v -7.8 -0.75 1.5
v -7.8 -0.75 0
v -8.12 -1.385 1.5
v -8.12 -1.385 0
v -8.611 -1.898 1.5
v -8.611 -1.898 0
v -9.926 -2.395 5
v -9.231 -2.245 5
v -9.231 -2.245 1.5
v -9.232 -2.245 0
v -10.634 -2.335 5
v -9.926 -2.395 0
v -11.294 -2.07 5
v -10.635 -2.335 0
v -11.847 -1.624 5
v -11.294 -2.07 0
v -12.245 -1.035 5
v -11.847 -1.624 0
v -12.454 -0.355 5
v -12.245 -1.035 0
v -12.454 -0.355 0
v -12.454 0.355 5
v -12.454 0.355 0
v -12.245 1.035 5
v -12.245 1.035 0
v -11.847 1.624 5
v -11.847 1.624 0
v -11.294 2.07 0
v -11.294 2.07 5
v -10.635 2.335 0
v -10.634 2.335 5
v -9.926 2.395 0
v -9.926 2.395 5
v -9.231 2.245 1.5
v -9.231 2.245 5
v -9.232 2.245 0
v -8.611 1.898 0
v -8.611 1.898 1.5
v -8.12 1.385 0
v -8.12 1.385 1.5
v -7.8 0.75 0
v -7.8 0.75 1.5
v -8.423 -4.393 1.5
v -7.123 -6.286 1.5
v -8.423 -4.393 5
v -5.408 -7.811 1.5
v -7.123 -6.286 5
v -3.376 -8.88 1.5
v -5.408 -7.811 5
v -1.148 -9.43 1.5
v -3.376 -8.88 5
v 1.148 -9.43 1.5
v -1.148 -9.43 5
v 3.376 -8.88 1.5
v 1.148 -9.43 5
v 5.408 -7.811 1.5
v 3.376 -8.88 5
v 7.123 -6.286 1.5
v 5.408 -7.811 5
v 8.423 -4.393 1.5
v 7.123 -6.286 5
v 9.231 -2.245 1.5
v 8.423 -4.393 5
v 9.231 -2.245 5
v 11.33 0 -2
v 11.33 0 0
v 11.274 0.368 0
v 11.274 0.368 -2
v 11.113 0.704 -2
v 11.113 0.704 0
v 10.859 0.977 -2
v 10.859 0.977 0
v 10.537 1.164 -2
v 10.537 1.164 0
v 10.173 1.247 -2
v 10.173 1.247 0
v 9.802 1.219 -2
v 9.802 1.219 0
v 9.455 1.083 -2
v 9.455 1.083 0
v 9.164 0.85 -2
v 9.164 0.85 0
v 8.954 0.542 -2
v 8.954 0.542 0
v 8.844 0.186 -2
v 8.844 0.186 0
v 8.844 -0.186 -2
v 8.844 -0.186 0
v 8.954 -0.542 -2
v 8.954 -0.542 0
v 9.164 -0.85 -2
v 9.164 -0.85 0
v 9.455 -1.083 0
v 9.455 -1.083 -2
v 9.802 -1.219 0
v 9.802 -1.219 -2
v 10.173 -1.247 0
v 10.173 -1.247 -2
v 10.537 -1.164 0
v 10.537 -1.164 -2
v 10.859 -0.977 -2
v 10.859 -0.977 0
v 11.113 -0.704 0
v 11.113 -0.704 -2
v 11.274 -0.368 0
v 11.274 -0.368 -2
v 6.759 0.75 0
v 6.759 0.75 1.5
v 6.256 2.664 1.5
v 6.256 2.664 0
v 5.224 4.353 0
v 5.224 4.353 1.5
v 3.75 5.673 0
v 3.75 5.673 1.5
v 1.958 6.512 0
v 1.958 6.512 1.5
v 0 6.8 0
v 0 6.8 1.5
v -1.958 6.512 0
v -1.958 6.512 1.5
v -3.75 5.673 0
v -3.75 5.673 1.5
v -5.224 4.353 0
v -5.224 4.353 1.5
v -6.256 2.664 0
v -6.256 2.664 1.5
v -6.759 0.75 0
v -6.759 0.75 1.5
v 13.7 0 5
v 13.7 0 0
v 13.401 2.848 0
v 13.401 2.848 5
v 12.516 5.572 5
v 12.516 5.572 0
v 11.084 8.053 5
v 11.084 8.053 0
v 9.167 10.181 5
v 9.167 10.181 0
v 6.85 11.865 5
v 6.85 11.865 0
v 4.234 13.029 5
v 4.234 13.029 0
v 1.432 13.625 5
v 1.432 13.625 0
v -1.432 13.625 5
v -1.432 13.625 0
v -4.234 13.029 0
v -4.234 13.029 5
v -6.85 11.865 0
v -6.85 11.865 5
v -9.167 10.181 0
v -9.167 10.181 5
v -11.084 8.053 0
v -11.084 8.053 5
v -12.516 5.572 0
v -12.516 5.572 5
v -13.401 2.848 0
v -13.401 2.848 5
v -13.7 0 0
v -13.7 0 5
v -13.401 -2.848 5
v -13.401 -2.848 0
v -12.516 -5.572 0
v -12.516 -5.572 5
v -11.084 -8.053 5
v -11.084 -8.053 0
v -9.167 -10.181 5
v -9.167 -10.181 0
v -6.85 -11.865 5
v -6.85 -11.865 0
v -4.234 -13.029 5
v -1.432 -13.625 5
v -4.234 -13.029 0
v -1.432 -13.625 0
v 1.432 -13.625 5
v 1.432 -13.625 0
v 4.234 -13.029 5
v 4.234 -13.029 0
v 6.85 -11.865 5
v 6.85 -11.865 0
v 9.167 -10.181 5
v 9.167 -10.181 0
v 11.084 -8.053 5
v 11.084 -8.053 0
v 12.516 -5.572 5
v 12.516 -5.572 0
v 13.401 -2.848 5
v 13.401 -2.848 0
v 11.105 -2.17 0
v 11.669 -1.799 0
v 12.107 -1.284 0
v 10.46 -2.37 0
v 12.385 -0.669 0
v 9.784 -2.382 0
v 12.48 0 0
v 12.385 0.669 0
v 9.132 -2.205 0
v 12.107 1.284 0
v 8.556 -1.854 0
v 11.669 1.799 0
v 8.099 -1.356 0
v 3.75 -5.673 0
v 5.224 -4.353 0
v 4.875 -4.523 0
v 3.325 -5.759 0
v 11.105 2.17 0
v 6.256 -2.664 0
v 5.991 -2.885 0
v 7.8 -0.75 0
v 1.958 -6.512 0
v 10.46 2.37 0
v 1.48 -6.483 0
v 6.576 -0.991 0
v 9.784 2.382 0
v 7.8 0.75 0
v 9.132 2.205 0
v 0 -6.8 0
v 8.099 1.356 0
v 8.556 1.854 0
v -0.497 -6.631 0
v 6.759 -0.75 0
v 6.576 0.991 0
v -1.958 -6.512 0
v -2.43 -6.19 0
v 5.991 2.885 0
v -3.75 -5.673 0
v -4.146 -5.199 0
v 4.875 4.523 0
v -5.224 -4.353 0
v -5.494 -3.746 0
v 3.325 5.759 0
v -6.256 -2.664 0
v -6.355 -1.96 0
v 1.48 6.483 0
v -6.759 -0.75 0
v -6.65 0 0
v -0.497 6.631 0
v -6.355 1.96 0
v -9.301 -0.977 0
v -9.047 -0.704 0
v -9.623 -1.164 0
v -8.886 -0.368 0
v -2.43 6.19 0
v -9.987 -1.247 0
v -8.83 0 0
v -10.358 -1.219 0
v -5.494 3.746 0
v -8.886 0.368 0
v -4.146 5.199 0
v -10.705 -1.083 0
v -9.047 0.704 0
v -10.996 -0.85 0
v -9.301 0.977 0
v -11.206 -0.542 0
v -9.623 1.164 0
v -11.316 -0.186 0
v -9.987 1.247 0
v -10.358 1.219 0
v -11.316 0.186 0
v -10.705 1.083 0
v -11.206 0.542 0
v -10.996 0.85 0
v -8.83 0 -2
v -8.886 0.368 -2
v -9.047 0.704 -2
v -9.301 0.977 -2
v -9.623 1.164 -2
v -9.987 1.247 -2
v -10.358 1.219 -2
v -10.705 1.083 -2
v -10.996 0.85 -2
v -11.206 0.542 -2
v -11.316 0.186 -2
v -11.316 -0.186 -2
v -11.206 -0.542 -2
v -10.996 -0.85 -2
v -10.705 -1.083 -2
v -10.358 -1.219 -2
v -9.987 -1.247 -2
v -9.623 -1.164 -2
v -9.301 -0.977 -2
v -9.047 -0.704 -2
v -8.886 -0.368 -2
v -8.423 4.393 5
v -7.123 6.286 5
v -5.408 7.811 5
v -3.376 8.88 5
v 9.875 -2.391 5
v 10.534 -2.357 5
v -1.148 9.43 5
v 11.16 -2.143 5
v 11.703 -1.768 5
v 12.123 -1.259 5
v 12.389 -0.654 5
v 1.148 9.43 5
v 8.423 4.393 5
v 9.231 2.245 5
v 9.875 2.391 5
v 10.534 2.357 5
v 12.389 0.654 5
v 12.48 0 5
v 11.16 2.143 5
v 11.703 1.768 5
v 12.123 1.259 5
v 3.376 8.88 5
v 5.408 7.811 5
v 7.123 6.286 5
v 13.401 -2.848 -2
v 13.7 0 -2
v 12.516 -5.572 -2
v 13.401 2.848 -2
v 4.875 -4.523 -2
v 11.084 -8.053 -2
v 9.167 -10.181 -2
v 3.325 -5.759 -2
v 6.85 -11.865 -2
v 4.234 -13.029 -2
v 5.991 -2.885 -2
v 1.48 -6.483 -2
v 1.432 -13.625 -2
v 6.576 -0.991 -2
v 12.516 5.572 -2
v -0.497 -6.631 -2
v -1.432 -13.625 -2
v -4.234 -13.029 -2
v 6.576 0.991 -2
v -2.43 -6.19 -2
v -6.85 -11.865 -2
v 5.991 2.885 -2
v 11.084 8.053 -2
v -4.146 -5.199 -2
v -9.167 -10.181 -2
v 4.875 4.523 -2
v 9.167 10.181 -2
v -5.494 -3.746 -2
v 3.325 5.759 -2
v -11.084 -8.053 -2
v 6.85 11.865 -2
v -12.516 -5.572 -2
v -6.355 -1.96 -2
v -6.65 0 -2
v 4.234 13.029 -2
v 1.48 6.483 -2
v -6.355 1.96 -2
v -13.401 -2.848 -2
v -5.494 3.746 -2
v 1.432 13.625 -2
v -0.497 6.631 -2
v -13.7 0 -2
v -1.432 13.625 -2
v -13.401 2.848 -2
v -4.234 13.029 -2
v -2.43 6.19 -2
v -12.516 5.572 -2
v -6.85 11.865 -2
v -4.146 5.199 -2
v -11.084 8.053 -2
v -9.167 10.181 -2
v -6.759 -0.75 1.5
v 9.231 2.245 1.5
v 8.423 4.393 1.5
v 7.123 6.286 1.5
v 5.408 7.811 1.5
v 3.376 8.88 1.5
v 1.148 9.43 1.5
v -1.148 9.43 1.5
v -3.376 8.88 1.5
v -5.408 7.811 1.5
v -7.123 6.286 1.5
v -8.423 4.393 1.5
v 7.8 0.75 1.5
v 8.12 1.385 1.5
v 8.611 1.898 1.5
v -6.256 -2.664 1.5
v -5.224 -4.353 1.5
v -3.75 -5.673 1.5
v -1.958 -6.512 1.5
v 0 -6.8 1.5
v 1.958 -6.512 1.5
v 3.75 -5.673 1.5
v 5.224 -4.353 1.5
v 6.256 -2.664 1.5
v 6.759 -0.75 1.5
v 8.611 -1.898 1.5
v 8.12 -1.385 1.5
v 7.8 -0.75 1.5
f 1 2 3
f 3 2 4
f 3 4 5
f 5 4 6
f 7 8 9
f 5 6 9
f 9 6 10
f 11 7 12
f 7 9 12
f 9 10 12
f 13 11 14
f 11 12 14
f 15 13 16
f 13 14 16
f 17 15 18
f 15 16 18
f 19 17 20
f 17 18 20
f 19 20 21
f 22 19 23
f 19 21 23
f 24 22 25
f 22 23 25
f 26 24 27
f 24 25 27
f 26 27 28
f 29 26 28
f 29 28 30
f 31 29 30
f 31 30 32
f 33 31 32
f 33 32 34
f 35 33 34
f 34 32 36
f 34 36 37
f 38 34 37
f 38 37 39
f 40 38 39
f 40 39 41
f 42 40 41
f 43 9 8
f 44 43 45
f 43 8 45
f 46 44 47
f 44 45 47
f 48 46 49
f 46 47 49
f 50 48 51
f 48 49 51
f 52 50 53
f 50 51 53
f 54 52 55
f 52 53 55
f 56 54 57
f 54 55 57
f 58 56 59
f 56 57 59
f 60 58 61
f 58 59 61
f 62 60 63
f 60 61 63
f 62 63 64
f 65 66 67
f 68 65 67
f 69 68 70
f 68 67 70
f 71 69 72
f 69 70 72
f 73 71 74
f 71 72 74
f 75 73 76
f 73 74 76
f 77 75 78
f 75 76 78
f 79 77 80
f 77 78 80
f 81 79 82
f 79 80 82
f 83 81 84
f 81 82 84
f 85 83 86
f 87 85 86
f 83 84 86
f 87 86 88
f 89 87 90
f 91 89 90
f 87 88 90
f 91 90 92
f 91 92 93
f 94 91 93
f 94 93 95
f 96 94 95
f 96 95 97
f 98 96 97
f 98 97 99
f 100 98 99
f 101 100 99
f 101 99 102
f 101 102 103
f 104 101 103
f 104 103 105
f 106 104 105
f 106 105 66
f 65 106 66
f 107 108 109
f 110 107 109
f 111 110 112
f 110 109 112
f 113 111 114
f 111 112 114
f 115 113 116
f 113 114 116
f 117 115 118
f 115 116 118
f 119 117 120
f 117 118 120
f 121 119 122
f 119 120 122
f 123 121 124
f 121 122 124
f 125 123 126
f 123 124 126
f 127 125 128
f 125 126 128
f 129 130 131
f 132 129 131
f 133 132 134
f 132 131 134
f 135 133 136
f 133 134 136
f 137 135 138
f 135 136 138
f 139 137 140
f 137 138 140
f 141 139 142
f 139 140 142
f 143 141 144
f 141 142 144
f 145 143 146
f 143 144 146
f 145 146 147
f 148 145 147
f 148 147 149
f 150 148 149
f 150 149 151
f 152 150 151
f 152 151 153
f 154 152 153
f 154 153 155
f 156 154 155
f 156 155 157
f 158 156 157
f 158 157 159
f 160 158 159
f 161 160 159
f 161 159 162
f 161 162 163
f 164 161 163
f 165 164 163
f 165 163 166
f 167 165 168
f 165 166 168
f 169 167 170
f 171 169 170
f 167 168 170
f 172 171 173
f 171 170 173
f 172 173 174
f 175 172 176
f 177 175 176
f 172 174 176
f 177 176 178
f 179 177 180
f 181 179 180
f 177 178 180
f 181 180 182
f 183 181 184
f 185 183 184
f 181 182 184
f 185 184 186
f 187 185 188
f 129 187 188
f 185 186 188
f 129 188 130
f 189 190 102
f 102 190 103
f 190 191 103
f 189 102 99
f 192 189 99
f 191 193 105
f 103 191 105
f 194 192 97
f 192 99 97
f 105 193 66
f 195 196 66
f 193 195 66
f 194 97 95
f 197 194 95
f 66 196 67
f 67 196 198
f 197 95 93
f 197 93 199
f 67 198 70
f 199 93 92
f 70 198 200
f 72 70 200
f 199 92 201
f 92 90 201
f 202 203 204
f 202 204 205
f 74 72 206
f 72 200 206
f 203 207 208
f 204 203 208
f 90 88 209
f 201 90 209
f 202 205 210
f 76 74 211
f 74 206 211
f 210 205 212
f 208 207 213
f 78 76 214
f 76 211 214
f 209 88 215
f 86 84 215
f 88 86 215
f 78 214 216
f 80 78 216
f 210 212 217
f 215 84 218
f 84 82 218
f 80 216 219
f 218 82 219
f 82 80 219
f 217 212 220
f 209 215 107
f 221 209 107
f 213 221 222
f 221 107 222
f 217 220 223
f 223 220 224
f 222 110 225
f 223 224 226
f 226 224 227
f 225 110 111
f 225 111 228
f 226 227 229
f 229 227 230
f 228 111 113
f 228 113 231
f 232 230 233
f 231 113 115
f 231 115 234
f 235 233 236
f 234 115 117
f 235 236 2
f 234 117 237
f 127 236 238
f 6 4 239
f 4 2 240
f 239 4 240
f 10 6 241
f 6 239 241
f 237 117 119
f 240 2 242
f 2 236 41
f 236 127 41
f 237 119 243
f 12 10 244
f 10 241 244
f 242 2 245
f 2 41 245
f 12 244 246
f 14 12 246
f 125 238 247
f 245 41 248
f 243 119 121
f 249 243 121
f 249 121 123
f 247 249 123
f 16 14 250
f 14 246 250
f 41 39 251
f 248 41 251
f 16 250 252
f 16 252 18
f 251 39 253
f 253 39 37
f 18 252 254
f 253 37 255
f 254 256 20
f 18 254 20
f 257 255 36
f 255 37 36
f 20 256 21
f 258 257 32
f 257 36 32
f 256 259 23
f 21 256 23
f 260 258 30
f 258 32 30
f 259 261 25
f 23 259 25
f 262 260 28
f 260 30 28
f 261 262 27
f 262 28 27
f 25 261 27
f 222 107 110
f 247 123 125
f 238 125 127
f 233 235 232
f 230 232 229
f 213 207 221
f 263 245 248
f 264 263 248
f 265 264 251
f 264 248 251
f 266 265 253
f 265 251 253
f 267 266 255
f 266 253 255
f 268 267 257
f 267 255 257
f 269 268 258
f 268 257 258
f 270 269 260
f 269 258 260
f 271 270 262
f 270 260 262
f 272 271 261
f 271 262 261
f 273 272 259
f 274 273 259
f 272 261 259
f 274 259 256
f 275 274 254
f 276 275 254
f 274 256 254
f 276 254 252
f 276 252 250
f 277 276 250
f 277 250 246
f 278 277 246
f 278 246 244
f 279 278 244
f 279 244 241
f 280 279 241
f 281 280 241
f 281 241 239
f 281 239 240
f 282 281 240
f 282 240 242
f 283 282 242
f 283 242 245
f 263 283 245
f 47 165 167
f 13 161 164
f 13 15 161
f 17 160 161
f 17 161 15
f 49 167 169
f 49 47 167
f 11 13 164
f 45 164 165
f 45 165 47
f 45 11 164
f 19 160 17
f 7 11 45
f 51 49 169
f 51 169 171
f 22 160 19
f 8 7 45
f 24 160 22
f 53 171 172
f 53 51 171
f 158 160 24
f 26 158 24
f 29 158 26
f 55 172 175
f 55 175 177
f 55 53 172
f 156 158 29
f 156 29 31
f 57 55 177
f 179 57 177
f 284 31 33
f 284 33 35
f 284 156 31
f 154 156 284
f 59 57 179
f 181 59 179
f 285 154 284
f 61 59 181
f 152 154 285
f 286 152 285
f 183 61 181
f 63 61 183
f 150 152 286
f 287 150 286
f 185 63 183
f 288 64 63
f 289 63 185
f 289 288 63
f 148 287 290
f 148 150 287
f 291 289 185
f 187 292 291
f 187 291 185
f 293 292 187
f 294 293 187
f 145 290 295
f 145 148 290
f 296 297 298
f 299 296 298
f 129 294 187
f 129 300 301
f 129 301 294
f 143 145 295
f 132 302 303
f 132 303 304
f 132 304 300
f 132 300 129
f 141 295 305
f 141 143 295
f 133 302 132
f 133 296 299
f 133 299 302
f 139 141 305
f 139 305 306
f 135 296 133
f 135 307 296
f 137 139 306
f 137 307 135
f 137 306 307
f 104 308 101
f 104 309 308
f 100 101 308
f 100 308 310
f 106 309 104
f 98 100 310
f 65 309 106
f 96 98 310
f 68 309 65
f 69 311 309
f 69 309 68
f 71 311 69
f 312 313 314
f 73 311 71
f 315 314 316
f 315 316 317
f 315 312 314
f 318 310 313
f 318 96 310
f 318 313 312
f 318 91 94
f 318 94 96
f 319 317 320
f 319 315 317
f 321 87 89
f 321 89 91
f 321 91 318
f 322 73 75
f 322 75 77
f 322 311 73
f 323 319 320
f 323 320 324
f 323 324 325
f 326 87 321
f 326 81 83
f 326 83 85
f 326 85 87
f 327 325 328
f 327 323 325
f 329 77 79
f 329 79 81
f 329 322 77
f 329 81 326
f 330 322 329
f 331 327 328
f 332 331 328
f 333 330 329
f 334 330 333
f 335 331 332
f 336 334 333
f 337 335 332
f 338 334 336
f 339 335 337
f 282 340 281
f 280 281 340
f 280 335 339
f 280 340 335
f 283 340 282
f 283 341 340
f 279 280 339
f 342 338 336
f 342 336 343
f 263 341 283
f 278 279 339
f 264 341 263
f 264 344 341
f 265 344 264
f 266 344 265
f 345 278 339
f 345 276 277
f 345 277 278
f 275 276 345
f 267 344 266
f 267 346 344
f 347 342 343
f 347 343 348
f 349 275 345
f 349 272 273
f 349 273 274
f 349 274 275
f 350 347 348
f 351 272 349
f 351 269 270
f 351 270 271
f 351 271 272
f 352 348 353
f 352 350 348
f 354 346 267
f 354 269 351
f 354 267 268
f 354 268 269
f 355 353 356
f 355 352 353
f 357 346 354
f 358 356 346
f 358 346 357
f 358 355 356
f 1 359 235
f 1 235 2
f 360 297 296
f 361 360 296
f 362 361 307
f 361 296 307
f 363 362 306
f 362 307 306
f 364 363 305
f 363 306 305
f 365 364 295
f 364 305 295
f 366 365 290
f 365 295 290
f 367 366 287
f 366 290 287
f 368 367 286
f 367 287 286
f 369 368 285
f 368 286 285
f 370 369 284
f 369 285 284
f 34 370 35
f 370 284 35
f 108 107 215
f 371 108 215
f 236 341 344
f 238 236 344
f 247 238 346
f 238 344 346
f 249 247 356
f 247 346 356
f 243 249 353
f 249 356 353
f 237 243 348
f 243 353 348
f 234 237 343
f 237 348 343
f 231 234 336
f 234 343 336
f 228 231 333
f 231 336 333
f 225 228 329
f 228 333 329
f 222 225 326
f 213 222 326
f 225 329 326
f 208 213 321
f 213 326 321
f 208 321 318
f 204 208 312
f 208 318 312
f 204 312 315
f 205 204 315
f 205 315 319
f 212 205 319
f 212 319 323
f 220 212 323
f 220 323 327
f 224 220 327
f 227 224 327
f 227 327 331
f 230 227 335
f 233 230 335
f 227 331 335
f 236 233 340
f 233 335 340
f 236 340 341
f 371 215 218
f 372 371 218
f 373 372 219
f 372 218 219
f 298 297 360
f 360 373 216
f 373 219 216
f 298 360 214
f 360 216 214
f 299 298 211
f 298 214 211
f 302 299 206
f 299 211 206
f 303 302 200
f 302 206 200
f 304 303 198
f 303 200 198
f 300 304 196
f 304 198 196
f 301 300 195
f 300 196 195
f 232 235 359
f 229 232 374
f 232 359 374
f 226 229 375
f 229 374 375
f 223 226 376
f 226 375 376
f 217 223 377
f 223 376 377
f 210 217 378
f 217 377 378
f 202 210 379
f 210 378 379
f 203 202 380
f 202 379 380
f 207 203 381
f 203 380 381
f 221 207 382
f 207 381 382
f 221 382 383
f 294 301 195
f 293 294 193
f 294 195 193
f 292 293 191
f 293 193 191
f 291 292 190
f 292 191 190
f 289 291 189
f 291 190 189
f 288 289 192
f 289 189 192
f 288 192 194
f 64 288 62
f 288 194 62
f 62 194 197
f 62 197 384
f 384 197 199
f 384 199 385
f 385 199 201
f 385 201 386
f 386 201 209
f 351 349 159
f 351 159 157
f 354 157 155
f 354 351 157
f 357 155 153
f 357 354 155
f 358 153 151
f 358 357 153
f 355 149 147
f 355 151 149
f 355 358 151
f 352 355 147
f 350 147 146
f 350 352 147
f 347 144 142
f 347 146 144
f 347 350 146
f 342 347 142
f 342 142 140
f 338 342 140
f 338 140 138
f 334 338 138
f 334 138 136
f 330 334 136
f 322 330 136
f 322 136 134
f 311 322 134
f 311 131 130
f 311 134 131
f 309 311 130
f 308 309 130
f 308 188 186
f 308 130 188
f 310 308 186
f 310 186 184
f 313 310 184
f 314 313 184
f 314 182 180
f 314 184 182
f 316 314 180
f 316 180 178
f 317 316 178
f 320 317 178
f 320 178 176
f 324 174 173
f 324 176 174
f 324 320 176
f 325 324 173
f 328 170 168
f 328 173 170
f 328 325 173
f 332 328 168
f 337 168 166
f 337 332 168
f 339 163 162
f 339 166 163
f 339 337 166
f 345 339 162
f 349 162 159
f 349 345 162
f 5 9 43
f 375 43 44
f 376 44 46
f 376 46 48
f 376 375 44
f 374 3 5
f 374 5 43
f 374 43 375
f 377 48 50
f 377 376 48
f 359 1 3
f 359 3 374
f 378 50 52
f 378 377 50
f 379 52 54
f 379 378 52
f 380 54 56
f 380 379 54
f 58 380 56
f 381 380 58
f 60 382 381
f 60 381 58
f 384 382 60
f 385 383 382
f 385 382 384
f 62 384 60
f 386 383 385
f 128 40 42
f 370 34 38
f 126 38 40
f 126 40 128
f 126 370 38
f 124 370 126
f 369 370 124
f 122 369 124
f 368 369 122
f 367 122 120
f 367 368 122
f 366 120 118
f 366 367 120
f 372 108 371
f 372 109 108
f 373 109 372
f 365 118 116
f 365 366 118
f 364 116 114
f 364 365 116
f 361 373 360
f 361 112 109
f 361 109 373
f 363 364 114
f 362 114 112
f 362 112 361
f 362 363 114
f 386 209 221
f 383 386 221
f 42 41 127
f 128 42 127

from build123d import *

# Parameters (mm, degrees)
CROQUIS1_R              = 13.7
SALIENTE_EXTRUIR1_DEPTH = 5
CROQUIS2_R              = 9.5
CORTAR_EXTRUIR1_DEPTH   = 3.5
CROQUIS3_R              = 6.8
CORTAR_EXTRUIR2_DEPTH   = 3
SALIENTE_EXTRUIR2_START = 2
CROQUIS4_R              = 13.7
CROQUIS4_R_2            = 6.65
SALIENTE_EXTRUIR2_DEPTH = 2
CROQUIS5_R              = 1.25
CORTAR_EXTRUIR3_DEPTH   = 21.600485431


with BuildPart() as part:
    # Croquis1 → Saliente-Extruir1 (new body)
    with BuildSketch(Plane.XY):
        Circle(CROQUIS1_R)
        with BuildLine():
            Line((0, 0.75), (7.800197377, 0.75))
            ThreePointArc((7.800197377, 0.75), (10.459785271, 2.369760146), (12.48, 0))
            ThreePointArc((12.48, 0), (10.459785271, -2.369760146), (7.800197377, -0.75))
            Line((7.800197377, -0.75), (0, -0.75))
            Line((0, -0.75), (-7.800197377, -0.75))
            ThreePointArc((-7.800197377, -0.75), (-12.48, 0), (-7.800197377, 0.75))
            Line((-7.800197377, 0.75), (0, 0.75))
        make_face(mode=Mode.SUBTRACT)
    extrude(amount=SALIENTE_EXTRUIR1_DEPTH)

    # Croquis2 → Cortar-Extruir1 (cut)
    with BuildSketch(Plane.XY.offset(5)):
        Circle(CROQUIS2_R)
    extrude(amount=-CORTAR_EXTRUIR1_DEPTH, mode=Mode.SUBTRACT)

    # Croquis3 → Cortar-Extruir2 (cut)
    with BuildSketch(Plane.XY.offset(1.5)):
        Circle(CROQUIS3_R)
    extrude(amount=-CORTAR_EXTRUIR2_DEPTH, mode=Mode.SUBTRACT)

    # Croquis4 → Saliente-Extruir2 (add)
    with BuildSketch(Plane(origin=(0, 0, 0), x_dir=(-1, 0, 0), z_dir=(0, 0, -1)).offset(SALIENTE_EXTRUIR2_START)):
        Circle(CROQUIS4_R)
        Circle(CROQUIS4_R_2, mode=Mode.SUBTRACT)
    extrude(amount=-SALIENTE_EXTRUIR2_DEPTH)

    # Croquis5 → Cortar-Extruir3 (cut, through all)
    with BuildSketch(Plane.XY.offset(5)):
        with Locations((-10.08, 0)):
            Circle(CROQUIS5_R)
        with Locations((10.08, 0)):
            Circle(CROQUIS5_R)
    extrude(amount=-CORTAR_EXTRUIR3_DEPTH, mode=Mode.SUBTRACT)


solid = part.part
